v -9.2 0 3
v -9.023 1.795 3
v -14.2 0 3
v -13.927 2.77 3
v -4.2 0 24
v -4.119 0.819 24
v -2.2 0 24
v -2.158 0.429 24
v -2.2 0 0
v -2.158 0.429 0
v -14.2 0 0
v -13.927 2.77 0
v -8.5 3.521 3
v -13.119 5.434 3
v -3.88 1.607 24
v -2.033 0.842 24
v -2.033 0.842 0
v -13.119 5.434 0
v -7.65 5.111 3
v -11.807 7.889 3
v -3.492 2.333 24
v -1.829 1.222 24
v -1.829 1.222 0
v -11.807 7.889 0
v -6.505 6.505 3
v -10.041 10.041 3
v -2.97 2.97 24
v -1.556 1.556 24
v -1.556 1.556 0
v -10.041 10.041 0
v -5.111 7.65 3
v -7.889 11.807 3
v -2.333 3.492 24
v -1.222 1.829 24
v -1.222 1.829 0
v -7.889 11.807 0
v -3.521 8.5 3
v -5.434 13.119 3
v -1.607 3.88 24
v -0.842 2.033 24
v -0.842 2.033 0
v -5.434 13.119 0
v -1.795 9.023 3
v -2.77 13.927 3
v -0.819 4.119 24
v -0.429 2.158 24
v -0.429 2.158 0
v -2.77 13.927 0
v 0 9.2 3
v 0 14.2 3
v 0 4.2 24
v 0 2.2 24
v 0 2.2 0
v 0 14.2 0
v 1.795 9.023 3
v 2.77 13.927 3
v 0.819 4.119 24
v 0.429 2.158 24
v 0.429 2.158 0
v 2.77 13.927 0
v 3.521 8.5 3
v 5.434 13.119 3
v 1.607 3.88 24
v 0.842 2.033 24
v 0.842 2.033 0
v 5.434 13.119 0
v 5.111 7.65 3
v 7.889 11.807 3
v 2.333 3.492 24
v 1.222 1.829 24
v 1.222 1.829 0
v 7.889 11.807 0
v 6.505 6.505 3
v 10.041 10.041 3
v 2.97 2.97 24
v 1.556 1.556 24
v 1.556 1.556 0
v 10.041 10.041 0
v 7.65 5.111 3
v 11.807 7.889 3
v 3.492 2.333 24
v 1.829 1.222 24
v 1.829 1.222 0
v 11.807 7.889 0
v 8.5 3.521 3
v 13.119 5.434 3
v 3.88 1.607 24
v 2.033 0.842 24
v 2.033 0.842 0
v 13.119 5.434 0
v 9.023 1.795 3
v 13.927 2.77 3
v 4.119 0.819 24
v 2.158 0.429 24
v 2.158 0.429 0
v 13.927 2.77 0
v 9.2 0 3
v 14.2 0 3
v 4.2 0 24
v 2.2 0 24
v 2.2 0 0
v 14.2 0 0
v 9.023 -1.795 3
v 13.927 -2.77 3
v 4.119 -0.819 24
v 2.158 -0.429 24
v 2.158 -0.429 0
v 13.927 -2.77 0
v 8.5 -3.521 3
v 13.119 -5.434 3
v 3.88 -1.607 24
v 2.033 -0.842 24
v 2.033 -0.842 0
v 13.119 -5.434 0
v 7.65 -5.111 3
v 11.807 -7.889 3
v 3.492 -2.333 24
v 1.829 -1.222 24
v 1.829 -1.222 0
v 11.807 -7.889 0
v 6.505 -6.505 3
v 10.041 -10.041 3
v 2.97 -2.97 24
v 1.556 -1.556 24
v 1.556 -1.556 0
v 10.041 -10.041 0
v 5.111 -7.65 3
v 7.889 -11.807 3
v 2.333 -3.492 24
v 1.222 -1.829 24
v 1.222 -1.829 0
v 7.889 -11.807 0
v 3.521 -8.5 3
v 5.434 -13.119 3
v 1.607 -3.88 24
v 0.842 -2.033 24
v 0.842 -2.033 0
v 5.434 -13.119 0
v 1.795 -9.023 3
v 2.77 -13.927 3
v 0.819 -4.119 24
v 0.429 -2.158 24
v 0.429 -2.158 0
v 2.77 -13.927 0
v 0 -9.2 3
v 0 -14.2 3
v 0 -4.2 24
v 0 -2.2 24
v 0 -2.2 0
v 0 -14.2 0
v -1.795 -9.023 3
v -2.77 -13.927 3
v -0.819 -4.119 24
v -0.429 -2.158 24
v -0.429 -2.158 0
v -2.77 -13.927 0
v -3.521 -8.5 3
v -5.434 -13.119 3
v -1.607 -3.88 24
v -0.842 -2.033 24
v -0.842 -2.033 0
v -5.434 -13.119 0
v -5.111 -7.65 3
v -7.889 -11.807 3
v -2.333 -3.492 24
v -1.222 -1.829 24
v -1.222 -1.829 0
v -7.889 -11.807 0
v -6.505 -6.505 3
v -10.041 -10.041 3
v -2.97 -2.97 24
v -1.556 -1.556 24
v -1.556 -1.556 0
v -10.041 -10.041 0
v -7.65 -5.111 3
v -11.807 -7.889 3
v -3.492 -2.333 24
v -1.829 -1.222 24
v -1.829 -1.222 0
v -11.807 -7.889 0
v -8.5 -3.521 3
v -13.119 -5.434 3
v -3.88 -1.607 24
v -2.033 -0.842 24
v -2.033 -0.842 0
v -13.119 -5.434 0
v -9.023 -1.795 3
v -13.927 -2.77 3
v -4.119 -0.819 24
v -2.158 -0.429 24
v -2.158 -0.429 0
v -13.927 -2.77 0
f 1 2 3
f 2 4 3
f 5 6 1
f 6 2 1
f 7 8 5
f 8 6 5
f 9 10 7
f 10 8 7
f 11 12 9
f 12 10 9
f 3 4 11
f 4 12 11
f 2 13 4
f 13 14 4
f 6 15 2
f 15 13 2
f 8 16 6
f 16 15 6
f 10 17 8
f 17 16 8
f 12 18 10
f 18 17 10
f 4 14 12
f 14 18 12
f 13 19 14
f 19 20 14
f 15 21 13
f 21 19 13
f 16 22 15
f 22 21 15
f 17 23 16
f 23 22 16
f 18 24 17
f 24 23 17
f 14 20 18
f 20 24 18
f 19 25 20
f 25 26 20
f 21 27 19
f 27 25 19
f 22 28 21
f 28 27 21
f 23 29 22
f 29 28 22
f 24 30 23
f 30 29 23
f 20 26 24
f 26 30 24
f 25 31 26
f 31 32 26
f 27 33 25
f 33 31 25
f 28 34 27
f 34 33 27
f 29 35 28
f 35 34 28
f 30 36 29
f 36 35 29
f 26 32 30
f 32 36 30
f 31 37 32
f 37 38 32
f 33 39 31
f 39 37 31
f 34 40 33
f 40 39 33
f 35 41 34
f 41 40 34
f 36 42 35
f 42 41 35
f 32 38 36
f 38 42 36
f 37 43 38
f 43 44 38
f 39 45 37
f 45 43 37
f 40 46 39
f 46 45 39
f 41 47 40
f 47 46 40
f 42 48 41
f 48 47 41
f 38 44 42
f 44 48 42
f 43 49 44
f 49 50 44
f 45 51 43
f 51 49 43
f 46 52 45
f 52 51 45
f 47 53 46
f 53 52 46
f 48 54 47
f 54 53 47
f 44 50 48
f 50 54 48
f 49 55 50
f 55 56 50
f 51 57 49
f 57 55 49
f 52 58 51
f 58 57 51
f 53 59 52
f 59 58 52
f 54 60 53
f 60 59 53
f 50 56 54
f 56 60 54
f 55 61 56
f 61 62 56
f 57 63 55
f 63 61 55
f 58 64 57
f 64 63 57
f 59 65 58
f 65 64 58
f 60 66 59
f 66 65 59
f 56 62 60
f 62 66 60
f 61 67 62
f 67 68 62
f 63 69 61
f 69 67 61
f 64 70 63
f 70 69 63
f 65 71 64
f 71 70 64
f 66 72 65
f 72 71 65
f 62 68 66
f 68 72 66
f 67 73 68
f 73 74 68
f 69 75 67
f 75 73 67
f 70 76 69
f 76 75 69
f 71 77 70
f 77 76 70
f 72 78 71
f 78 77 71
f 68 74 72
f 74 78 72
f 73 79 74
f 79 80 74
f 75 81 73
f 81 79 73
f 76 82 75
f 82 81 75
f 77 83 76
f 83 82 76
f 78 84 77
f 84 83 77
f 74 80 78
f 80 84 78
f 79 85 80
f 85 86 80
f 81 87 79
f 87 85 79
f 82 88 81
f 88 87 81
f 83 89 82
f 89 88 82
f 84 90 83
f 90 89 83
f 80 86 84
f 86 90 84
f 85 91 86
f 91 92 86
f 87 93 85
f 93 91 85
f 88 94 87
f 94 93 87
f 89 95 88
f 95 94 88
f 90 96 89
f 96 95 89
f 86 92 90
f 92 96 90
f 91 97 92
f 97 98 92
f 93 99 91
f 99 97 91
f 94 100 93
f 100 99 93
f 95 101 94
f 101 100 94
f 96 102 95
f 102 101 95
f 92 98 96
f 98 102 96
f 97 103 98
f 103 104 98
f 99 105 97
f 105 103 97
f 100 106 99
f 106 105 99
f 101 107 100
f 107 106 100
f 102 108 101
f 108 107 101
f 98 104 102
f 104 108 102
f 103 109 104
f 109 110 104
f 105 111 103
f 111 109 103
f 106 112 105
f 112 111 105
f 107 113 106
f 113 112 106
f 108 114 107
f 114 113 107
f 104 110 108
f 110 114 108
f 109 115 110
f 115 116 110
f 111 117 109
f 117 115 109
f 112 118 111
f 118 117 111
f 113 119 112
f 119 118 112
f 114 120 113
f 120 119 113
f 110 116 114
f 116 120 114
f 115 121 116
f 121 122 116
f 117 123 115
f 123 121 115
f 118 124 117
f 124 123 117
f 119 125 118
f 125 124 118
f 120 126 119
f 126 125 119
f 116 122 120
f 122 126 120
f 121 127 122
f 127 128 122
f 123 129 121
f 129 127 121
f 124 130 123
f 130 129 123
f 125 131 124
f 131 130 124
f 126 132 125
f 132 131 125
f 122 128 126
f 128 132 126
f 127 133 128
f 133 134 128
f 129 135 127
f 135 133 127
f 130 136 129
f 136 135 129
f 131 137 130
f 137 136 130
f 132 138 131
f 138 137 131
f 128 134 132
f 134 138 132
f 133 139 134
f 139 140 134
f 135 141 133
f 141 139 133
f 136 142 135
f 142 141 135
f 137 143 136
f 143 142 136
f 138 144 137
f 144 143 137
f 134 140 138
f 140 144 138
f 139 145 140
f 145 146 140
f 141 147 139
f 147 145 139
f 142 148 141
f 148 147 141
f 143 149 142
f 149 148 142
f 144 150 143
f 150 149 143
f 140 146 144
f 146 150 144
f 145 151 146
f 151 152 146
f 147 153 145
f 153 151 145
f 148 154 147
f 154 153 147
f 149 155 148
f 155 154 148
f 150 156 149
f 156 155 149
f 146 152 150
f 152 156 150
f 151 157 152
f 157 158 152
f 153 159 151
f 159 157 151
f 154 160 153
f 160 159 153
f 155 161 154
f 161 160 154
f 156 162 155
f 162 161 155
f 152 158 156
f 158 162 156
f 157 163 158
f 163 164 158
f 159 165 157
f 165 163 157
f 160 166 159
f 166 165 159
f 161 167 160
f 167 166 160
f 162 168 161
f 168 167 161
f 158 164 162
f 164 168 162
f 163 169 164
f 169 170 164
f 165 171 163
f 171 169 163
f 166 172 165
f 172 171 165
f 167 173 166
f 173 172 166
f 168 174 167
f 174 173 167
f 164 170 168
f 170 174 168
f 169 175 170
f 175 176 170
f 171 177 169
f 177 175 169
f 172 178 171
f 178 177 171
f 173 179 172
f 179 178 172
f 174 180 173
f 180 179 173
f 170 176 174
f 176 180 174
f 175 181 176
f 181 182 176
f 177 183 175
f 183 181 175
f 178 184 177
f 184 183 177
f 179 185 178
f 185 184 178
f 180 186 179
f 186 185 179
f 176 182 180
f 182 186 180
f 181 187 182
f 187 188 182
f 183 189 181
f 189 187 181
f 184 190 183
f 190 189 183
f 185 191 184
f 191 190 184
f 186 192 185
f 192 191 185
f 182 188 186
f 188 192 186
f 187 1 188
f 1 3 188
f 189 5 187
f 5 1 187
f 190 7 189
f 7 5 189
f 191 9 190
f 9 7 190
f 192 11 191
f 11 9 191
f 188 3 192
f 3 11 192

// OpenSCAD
$fn = 32;

// ----------------------------------------------------------------------
// Profiled standoff: conical spacer, 24 mm long, bore 4.4 mm
// ----------------------------------------------------------------------

// --- parameters (mm) ---
revolve_angle = 360;      // full turn around the Z axis
profile_points = 6;       // points of the closed outline

profile = [[2.2, 0], [14.2, 0], [14.2, 3], [9.2, 3], [4.2, 24], [2.2, 24]];  // single closed polygon, 6 points, counter clockwise

// --- the one profile operation ---
rotate_extrude(angle = revolve_angle) polygon(points = profile);
